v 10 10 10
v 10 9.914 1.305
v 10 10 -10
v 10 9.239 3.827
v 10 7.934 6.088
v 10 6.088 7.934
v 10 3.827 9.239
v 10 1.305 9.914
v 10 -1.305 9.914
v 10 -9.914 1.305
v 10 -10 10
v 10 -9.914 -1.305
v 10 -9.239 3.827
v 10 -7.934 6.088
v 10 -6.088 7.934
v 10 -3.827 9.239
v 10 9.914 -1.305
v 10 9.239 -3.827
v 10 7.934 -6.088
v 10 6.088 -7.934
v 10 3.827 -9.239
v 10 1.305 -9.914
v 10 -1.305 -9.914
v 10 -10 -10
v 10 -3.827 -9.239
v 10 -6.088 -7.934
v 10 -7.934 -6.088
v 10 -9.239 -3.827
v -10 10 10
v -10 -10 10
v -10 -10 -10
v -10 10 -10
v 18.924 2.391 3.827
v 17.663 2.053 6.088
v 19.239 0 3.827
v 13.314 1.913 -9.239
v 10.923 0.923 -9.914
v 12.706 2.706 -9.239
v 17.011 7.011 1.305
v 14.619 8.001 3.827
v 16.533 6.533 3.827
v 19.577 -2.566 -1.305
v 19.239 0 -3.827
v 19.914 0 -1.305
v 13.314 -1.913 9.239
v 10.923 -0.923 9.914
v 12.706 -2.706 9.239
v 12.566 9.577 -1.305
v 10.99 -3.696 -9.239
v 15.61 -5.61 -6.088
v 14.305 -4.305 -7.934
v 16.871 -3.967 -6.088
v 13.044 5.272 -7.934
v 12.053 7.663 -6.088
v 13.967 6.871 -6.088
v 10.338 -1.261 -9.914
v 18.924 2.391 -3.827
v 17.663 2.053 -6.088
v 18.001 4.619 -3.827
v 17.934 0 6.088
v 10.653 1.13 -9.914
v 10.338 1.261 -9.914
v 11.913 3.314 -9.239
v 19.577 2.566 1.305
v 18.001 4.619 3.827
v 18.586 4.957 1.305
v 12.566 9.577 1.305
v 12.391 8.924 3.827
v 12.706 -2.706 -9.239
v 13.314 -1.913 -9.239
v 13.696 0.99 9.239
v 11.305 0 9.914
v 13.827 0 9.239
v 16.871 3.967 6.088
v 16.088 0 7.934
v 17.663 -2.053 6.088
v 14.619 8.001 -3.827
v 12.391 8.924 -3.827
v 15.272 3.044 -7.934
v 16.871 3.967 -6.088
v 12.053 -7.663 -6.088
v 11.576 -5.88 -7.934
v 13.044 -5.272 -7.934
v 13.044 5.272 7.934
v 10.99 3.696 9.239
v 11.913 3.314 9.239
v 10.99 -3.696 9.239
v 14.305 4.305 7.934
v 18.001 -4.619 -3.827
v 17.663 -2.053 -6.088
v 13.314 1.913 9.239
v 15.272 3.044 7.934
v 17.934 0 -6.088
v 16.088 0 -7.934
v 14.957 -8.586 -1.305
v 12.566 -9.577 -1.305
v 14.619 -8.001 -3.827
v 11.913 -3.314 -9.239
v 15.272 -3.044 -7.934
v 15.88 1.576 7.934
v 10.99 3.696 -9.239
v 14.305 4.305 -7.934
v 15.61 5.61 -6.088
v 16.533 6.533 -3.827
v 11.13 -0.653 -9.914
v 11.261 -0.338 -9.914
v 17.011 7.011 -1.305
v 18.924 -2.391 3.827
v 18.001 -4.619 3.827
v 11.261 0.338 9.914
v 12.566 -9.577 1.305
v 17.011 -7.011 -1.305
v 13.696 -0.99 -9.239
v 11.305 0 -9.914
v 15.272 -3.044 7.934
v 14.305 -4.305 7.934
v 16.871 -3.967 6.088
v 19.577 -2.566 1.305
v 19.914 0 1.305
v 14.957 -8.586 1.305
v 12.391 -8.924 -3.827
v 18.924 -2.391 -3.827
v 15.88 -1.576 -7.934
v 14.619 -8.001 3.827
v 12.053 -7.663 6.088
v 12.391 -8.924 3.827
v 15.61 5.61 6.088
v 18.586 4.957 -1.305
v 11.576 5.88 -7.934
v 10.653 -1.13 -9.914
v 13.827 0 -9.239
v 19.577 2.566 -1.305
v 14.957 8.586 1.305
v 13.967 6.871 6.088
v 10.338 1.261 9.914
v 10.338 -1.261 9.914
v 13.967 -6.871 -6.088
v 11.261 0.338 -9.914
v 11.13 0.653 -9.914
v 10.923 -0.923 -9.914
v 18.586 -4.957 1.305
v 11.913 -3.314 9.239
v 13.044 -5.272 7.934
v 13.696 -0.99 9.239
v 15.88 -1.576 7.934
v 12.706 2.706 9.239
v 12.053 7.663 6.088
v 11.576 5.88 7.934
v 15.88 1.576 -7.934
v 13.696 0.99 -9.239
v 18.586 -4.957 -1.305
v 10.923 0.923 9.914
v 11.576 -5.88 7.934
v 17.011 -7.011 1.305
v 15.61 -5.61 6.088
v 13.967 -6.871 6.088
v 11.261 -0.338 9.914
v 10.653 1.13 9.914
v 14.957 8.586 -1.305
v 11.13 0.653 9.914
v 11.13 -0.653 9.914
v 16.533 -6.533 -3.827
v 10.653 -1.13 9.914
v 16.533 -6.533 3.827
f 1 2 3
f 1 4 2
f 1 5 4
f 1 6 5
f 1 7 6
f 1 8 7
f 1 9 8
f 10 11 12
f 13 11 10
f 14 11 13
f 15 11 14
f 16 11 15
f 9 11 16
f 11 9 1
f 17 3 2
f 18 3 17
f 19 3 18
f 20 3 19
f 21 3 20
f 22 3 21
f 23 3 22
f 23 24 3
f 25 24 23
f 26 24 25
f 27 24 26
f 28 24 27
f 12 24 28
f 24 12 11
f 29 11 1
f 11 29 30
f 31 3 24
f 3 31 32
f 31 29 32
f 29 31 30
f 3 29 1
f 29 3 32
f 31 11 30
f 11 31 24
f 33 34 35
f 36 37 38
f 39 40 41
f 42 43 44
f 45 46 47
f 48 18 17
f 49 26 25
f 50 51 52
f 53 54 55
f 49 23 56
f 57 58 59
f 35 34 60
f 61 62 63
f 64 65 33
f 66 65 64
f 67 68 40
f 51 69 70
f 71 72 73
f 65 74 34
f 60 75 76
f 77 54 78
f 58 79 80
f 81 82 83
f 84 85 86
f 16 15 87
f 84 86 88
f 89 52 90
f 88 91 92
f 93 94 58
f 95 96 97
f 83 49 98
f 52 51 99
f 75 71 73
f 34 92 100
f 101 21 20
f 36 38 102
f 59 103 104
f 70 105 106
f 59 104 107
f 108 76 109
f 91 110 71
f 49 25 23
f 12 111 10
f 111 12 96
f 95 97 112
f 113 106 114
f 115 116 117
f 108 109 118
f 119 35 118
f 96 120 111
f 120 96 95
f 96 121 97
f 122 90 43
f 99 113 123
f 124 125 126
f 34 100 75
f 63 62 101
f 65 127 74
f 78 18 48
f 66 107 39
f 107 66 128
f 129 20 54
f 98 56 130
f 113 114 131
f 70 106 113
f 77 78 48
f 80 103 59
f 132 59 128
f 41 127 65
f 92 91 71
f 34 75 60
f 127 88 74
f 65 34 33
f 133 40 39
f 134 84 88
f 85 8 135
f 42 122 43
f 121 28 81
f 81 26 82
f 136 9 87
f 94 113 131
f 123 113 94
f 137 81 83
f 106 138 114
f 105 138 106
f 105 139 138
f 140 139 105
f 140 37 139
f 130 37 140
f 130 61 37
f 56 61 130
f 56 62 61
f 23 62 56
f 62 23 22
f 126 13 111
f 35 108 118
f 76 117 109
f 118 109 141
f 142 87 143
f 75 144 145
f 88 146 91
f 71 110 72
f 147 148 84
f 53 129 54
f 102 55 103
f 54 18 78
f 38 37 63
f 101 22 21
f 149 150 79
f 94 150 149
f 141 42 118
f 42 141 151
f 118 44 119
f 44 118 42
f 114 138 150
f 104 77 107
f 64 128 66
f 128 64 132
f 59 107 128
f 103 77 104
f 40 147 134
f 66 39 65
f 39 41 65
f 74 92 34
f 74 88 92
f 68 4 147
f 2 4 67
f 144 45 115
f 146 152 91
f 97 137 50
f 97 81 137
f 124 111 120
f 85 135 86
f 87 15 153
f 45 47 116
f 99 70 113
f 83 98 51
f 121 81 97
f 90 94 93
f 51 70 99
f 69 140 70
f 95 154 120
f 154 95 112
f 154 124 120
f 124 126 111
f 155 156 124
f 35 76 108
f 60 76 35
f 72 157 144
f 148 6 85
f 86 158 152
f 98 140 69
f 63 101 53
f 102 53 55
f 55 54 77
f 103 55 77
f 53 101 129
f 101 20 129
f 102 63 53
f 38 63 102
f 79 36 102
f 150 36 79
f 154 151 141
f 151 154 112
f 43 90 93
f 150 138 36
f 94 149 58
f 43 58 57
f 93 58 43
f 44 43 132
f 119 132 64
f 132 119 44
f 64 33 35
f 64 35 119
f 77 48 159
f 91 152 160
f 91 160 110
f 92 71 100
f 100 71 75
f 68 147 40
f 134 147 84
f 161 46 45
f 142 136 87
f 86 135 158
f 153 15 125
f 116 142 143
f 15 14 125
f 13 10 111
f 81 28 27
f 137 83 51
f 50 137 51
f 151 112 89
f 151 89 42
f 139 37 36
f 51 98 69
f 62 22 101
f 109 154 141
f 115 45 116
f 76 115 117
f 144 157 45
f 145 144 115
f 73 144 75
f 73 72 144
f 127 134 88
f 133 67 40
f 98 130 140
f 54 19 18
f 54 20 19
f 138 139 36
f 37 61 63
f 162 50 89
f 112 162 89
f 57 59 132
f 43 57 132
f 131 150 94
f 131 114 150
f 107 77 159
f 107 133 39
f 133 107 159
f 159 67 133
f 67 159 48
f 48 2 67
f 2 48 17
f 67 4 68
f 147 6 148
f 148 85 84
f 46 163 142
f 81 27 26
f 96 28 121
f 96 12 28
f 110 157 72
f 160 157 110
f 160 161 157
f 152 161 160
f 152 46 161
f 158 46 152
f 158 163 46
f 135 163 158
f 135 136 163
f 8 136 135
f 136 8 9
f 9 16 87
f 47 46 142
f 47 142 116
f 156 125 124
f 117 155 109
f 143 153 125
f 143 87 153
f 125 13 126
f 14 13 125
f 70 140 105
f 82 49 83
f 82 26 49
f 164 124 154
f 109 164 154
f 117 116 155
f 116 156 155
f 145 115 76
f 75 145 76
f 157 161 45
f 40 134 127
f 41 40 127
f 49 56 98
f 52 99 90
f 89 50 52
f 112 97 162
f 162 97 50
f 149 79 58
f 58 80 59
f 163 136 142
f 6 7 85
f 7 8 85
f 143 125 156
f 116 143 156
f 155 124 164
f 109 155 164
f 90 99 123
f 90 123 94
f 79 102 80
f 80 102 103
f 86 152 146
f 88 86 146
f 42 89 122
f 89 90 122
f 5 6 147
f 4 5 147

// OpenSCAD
union(){cube(20,center=true);translate([10,0,0])sphere(10,$fn=24);}
